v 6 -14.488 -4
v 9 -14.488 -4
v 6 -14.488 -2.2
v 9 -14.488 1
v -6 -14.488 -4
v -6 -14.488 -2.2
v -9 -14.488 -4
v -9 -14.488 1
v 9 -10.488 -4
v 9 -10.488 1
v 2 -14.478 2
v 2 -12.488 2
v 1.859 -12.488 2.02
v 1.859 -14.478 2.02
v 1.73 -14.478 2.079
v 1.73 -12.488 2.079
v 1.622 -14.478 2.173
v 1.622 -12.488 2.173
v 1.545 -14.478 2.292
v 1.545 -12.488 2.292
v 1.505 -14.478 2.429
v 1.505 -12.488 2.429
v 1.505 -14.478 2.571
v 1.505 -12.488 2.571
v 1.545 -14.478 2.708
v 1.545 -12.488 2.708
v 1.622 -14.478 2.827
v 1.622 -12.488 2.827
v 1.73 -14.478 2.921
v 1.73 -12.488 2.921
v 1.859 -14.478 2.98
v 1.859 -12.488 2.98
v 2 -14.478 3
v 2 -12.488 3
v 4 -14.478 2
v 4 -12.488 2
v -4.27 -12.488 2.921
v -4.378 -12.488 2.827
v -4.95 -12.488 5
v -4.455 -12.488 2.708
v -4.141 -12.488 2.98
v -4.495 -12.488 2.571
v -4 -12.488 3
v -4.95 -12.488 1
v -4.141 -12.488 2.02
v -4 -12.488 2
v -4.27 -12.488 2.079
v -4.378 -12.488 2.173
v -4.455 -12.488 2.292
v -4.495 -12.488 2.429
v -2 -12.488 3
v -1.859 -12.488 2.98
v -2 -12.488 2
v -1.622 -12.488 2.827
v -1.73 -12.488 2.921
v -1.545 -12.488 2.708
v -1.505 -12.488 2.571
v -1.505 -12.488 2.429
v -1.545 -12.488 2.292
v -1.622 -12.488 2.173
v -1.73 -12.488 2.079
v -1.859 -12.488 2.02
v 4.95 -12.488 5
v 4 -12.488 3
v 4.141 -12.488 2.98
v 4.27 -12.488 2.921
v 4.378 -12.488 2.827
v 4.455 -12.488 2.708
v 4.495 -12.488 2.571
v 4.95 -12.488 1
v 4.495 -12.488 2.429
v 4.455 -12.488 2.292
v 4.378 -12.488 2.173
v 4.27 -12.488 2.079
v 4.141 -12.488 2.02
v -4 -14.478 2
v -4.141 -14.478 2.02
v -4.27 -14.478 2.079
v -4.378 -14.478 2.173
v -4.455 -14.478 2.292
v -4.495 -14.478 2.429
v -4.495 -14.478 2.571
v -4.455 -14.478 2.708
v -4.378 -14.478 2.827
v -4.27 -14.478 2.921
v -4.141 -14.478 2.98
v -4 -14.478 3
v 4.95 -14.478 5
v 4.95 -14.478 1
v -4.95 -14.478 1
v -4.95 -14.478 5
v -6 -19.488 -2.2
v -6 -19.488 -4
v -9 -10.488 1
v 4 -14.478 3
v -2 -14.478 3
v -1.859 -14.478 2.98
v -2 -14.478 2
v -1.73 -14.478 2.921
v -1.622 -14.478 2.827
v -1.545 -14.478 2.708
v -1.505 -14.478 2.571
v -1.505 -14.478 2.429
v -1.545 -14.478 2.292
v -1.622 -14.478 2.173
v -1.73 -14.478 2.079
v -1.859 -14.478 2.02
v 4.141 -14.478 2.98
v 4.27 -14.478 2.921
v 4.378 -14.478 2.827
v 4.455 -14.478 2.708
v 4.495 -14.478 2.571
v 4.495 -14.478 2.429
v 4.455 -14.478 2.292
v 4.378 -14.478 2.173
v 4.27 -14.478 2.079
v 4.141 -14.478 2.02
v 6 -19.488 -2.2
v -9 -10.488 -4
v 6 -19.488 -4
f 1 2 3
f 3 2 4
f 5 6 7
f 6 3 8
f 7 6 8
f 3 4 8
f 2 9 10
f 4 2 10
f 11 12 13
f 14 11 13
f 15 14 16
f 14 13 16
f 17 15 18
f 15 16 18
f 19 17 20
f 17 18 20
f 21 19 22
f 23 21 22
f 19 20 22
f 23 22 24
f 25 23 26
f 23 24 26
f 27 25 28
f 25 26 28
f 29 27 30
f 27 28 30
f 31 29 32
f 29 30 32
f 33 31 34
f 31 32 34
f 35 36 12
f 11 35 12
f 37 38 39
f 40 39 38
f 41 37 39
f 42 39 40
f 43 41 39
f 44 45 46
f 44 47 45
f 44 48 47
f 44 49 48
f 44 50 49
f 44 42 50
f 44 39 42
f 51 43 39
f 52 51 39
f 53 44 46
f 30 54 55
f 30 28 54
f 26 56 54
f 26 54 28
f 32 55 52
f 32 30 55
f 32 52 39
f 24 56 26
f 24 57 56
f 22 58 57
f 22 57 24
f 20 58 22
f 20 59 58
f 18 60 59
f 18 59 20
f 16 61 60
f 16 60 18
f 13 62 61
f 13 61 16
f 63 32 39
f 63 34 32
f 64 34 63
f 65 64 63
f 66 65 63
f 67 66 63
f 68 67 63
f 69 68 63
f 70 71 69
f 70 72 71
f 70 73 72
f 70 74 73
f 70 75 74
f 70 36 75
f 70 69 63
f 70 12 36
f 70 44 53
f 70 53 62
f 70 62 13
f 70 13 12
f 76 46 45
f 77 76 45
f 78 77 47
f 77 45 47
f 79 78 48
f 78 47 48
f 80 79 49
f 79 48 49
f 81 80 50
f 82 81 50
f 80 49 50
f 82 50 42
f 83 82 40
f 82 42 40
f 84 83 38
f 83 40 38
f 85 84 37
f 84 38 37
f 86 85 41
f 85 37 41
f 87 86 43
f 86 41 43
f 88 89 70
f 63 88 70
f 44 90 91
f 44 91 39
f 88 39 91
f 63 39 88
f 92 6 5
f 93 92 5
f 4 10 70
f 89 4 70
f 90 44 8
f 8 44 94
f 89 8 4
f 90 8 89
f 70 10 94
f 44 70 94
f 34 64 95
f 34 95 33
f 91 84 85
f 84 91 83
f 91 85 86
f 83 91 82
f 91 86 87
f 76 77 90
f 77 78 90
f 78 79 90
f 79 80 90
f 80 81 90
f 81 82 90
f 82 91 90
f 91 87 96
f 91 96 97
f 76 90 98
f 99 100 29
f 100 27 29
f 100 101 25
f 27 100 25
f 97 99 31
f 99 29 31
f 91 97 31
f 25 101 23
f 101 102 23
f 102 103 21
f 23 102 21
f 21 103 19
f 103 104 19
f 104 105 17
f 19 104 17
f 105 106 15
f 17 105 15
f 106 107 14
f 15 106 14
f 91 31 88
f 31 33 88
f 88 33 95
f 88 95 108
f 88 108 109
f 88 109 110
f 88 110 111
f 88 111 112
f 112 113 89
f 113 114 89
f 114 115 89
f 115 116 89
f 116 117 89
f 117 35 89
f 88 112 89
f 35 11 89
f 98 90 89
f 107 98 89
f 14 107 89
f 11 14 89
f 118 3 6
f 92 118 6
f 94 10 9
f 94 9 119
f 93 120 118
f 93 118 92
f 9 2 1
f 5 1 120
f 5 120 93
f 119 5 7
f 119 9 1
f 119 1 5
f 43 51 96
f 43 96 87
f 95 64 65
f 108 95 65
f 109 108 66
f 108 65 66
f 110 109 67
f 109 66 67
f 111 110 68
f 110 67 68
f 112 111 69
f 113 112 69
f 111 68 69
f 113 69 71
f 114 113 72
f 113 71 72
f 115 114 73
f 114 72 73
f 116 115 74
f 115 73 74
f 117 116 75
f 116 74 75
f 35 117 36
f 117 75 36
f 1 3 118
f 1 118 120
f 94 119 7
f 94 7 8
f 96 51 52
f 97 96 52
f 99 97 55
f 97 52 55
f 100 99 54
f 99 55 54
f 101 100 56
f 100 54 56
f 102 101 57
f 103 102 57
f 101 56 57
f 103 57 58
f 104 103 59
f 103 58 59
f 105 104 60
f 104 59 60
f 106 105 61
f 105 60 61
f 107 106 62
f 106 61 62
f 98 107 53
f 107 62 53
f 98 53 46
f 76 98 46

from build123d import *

# Parameters (mm, degrees)
SKETCH008_W     = 18
SKETCH008_H     = 5
PAD008_DEPTH    = 4
SKETCH010_W     = 9.9
SKETCH010_H     = 1.99
PAD009_DEPTH    = 4
POCKET006_DEPTH = 5
SKETCH014_W     = 12
SKETCH014_H     = 1.8
PAD011_DEPTH    = 5


with BuildPart() as part:
    # Sketch008 → Pad008 (new body)
    with BuildSketch(Plane(origin=(0, -10.4875, 0), x_dir=(-1, 0, 0), z_dir=(0, 1, 0))):
        with Locations((0, -1.5)):
            Rectangle(SKETCH008_W, SKETCH008_H)
    extrude(amount=-PAD008_DEPTH)

    # Sketch010 → Pad009 (new body)
    with BuildSketch(Plane(origin=(0, -10.4875, 1), x_dir=(1, 0, 0), z_dir=(0, 0, 1))):
        with Locations((0, -2.995)):
            Rectangle(SKETCH010_W, SKETCH010_H)
    extrude(amount=PAD009_DEPTH)

    # Sketch013 → Pocket006 (cut)
    with BuildSketch(Plane(origin=(0, -12.4875, 0), x_dir=(-1, 0, 0), z_dir=(0, 1, 0))):
        with BuildLine():
            ThreePointArc((2, 3), (1.5, 2.5), (2, 2))
            Line((2, 2), (4, 2))
            ThreePointArc((4, 2), (4.5, 2.5), (4, 3))
            Line((2, 3), (4, 3))
        make_face()
        with BuildLine():
            ThreePointArc((-4, 3), (-4.5, 2.5), (-4, 2))
            Line((-4, 2), (-2, 2))
            ThreePointArc((-2, 2), (-1.5, 2.5), (-2, 3))
            Line((-4, 3), (-2, 3))
        make_face()
    extrude(amount=-POCKET006_DEPTH, mode=Mode.SUBTRACT)

    # Sketch014 → Pad011 (new body)
    with BuildSketch(Plane(origin=(0, -14.4875, 0), x_dir=(-1, 0, 0), z_dir=(0, -1, 0))):
        with Locations((0, 3.1)):
            Rectangle(SKETCH014_W, SKETCH014_H)
    extrude(amount=PAD011_DEPTH)


solid = part.part
